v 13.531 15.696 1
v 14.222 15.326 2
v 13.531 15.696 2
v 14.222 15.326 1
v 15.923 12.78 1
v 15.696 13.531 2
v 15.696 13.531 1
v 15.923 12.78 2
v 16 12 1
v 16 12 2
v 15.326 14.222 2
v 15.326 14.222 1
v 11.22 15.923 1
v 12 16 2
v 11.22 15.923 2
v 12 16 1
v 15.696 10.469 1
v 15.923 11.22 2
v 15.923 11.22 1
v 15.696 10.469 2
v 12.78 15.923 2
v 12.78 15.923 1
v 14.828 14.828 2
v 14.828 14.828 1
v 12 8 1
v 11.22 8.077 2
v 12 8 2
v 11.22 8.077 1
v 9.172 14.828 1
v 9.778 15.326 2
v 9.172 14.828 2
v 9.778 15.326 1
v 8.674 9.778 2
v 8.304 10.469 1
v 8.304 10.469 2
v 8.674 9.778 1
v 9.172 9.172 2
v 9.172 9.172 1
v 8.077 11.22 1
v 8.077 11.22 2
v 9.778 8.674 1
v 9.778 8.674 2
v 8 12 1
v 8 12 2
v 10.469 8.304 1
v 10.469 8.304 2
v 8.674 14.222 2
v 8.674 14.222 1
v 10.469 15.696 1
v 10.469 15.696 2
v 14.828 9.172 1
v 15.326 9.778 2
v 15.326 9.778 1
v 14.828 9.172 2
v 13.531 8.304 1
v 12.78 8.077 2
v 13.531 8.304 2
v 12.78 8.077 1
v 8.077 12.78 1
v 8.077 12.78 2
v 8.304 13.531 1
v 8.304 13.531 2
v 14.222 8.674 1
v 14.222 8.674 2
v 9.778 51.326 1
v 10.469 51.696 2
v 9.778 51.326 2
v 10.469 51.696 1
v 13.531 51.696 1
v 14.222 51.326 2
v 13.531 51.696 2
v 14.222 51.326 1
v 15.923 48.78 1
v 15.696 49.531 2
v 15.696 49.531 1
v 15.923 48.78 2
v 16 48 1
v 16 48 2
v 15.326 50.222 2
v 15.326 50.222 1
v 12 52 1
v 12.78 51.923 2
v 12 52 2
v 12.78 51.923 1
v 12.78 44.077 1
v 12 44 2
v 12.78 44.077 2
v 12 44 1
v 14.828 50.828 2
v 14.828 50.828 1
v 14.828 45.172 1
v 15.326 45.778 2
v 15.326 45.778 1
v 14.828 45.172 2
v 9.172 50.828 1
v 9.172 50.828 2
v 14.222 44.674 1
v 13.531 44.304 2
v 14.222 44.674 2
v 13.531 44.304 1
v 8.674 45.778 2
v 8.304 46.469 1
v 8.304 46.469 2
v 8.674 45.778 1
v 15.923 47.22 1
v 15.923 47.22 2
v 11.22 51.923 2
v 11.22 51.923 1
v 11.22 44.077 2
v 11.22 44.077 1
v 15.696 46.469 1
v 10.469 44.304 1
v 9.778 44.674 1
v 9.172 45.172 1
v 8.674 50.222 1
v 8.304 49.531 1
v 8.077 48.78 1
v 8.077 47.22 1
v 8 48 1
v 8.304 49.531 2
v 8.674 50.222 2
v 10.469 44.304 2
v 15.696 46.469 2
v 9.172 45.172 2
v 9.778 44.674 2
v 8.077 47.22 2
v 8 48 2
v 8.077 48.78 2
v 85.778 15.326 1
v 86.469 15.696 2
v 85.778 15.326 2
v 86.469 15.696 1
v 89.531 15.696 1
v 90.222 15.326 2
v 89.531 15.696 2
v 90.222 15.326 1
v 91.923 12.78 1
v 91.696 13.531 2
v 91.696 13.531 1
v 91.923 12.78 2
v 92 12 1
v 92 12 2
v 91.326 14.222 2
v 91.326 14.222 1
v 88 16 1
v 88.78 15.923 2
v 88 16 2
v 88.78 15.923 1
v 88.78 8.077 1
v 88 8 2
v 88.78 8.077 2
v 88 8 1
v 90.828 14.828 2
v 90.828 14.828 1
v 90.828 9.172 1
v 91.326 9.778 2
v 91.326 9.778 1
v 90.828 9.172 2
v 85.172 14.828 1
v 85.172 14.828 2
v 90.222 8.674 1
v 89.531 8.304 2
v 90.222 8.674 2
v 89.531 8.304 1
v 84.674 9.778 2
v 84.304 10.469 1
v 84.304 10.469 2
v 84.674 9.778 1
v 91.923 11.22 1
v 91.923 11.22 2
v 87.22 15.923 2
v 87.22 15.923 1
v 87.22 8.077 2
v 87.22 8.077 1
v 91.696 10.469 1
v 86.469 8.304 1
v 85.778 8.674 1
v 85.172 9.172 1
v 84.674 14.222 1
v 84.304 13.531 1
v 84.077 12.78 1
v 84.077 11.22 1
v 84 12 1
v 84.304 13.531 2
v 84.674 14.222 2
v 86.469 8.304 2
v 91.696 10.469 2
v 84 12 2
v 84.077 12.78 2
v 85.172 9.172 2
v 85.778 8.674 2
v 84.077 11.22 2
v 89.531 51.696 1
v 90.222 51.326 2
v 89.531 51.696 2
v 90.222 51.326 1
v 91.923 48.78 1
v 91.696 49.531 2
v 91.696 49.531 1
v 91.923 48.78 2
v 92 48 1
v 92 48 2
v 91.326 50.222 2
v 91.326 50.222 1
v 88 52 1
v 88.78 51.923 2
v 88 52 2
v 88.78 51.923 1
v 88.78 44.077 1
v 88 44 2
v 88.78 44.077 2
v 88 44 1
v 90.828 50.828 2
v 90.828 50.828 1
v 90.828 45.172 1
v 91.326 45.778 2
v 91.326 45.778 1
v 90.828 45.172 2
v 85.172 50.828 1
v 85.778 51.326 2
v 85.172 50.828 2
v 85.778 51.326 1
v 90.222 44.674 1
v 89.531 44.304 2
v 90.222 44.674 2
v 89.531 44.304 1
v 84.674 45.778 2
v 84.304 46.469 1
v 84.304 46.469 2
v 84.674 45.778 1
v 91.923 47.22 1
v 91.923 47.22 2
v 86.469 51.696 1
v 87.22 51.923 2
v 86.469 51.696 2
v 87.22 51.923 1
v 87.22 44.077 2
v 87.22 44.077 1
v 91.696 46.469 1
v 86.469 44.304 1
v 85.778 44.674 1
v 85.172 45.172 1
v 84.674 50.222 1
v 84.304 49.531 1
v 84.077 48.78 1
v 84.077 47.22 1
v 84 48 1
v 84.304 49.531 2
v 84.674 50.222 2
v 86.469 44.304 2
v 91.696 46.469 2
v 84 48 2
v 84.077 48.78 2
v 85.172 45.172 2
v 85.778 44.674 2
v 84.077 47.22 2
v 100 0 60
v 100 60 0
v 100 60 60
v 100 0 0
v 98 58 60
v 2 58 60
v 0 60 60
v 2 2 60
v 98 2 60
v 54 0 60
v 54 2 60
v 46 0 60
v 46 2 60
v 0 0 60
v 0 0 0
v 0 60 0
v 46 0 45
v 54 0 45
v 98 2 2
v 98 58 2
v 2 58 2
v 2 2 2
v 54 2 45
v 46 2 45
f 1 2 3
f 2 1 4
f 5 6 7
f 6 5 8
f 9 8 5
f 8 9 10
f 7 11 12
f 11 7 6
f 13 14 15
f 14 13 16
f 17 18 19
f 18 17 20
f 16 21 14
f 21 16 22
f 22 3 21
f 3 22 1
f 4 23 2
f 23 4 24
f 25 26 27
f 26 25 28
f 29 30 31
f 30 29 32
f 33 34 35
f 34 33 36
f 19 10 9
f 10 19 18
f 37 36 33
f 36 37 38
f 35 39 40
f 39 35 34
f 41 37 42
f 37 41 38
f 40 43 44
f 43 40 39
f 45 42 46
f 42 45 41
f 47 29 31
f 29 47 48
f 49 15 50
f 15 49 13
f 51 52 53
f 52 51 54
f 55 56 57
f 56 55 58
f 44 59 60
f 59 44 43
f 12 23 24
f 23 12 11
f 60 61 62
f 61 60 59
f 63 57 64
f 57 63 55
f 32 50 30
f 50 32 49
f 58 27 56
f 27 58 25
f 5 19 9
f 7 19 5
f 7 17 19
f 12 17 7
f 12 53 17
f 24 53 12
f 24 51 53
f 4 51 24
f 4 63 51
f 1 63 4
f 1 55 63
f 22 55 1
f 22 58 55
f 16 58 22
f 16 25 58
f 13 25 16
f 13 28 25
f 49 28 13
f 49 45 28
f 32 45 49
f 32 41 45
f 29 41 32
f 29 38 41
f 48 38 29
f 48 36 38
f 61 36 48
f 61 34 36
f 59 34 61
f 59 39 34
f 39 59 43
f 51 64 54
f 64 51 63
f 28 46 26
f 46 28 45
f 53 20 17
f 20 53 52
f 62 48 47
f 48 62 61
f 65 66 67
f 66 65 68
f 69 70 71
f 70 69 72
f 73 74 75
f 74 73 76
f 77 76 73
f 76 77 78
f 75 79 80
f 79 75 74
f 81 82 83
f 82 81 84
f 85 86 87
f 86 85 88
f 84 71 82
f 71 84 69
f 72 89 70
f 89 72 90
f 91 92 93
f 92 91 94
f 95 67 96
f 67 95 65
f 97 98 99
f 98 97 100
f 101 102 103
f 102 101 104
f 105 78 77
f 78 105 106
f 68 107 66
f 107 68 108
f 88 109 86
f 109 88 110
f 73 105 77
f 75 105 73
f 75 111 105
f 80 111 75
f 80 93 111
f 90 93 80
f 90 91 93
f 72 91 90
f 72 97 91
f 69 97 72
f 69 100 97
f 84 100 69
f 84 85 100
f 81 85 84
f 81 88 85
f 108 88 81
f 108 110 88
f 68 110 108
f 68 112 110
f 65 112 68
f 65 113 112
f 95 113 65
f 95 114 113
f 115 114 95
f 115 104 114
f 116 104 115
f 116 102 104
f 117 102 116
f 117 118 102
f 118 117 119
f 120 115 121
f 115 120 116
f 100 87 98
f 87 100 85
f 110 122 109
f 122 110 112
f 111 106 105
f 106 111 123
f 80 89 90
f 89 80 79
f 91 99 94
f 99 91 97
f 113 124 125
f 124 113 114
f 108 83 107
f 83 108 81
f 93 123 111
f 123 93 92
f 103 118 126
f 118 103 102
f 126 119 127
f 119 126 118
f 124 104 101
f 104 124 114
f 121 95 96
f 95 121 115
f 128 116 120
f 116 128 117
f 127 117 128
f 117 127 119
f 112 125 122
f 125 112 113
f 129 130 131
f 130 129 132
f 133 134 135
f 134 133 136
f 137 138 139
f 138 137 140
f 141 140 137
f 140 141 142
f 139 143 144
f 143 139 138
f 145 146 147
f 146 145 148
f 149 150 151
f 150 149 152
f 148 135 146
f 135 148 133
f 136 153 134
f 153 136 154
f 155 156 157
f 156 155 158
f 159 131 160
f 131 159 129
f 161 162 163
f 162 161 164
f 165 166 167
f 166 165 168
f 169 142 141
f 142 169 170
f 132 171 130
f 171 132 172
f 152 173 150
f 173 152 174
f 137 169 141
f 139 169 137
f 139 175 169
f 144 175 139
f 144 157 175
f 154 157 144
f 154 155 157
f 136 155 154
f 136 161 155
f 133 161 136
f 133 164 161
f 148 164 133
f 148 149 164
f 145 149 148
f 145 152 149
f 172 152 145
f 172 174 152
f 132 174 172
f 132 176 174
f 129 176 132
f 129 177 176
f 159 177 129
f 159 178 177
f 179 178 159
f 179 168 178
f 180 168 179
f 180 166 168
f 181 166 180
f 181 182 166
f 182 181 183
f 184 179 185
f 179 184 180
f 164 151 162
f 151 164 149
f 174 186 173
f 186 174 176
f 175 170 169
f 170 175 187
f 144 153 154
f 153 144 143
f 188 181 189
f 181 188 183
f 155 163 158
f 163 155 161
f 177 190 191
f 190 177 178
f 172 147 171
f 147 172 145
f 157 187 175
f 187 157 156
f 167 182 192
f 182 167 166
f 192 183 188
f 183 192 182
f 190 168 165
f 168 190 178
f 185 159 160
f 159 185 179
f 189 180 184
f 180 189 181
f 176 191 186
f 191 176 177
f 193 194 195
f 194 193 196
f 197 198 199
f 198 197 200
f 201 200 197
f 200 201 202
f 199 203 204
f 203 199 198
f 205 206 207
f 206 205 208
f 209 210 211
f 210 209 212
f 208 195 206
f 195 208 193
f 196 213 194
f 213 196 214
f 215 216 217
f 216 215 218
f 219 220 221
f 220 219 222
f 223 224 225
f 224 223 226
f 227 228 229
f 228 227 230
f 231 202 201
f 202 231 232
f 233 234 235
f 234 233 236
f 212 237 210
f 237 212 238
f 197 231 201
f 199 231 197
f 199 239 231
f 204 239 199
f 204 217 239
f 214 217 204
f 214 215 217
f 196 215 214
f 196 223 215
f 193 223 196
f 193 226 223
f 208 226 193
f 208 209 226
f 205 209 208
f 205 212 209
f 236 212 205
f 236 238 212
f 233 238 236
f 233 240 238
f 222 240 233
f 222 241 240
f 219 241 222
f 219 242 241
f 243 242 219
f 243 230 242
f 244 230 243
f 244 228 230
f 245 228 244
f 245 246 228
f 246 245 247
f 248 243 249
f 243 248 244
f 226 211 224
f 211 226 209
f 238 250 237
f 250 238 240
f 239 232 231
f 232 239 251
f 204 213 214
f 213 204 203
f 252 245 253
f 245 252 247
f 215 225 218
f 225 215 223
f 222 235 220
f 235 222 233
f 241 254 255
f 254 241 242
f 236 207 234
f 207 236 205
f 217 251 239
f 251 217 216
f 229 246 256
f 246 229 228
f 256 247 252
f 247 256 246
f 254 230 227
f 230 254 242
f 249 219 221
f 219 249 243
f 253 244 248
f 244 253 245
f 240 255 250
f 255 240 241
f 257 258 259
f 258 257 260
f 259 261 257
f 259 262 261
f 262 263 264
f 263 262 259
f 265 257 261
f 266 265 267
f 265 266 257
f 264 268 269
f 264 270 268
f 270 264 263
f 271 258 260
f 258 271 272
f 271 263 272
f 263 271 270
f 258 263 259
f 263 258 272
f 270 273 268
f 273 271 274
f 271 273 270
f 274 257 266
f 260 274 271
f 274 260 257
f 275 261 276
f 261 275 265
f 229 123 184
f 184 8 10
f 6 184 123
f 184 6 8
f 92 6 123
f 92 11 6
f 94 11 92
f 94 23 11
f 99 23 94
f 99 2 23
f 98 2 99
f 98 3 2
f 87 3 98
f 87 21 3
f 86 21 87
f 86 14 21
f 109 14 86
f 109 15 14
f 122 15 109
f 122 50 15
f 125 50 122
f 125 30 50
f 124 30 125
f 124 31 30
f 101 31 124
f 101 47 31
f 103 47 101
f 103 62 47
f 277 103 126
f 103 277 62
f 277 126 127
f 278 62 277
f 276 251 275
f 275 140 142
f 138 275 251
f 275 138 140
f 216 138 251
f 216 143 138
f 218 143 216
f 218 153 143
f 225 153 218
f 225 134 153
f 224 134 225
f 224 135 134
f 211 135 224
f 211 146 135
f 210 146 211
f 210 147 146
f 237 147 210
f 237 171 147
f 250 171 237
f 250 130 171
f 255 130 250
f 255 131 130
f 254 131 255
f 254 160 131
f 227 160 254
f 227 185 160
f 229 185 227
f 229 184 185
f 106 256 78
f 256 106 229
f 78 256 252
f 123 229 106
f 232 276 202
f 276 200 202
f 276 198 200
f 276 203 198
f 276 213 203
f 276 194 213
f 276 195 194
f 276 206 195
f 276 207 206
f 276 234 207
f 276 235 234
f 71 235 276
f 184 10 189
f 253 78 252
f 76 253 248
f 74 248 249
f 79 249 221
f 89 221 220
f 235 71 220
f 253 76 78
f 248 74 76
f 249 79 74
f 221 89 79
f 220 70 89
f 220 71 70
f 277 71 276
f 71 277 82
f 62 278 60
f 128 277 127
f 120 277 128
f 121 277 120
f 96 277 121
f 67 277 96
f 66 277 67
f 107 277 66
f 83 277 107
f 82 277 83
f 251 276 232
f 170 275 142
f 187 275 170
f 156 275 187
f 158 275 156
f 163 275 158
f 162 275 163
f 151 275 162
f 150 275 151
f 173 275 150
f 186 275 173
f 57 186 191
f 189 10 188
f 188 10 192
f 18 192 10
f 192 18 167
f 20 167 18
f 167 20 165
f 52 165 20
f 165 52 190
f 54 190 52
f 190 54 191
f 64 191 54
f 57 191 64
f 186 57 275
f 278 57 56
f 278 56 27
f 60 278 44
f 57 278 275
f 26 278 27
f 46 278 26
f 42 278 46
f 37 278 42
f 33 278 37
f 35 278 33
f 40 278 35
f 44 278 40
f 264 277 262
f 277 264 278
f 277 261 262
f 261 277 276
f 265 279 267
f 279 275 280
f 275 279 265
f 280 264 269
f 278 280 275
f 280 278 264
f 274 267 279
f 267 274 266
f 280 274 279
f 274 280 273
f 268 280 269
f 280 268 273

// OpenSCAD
$fn = 32;

// ----------------------------------------------------------------------
// Enclosure box: both enclosure
// ----------------------------------------------------------------------

// --- parameters (mm) ---
box_l = 100;              // outer length, X
box_w = 60;               // outer width, Y
box_h = 60;               // outer height
wall_t = 2;               // wall thickness
boss_r = 4;               // corner boss radius
hole_r = 1.5;             // boss screw hole radius
boss_in = 12;             // boss inset from the corners
notch_w = 8;              // cable notch width
notch_h = 15;             // cable notch height

inner_h = box_h - wall_t;  // cavity depth
boss_h = inner_h - 2;  // corner boss height

difference() {
  cube([box_l, box_w, box_h]);
  translate([wall_t, wall_t, wall_t])
    cube([box_l - 2 * wall_t, box_w - 2 * wall_t, box_h]);
  for (sx = [0, 1], sy = [0, 1])
    translate([sx ? box_l - boss_in : boss_in,
               sy ? box_w - boss_in : boss_in, wall_t - 1]) {
      cylinder(r = boss_r, h = boss_h);
      translate([0, 0, boss_h - 4])
        cylinder(r = hole_r, h = 5);
    }
  translate([box_l / 2 - notch_w / 2, -1, box_h - notch_h])
    cube([notch_w, wall_t + 2, notch_h + 1]);
}
